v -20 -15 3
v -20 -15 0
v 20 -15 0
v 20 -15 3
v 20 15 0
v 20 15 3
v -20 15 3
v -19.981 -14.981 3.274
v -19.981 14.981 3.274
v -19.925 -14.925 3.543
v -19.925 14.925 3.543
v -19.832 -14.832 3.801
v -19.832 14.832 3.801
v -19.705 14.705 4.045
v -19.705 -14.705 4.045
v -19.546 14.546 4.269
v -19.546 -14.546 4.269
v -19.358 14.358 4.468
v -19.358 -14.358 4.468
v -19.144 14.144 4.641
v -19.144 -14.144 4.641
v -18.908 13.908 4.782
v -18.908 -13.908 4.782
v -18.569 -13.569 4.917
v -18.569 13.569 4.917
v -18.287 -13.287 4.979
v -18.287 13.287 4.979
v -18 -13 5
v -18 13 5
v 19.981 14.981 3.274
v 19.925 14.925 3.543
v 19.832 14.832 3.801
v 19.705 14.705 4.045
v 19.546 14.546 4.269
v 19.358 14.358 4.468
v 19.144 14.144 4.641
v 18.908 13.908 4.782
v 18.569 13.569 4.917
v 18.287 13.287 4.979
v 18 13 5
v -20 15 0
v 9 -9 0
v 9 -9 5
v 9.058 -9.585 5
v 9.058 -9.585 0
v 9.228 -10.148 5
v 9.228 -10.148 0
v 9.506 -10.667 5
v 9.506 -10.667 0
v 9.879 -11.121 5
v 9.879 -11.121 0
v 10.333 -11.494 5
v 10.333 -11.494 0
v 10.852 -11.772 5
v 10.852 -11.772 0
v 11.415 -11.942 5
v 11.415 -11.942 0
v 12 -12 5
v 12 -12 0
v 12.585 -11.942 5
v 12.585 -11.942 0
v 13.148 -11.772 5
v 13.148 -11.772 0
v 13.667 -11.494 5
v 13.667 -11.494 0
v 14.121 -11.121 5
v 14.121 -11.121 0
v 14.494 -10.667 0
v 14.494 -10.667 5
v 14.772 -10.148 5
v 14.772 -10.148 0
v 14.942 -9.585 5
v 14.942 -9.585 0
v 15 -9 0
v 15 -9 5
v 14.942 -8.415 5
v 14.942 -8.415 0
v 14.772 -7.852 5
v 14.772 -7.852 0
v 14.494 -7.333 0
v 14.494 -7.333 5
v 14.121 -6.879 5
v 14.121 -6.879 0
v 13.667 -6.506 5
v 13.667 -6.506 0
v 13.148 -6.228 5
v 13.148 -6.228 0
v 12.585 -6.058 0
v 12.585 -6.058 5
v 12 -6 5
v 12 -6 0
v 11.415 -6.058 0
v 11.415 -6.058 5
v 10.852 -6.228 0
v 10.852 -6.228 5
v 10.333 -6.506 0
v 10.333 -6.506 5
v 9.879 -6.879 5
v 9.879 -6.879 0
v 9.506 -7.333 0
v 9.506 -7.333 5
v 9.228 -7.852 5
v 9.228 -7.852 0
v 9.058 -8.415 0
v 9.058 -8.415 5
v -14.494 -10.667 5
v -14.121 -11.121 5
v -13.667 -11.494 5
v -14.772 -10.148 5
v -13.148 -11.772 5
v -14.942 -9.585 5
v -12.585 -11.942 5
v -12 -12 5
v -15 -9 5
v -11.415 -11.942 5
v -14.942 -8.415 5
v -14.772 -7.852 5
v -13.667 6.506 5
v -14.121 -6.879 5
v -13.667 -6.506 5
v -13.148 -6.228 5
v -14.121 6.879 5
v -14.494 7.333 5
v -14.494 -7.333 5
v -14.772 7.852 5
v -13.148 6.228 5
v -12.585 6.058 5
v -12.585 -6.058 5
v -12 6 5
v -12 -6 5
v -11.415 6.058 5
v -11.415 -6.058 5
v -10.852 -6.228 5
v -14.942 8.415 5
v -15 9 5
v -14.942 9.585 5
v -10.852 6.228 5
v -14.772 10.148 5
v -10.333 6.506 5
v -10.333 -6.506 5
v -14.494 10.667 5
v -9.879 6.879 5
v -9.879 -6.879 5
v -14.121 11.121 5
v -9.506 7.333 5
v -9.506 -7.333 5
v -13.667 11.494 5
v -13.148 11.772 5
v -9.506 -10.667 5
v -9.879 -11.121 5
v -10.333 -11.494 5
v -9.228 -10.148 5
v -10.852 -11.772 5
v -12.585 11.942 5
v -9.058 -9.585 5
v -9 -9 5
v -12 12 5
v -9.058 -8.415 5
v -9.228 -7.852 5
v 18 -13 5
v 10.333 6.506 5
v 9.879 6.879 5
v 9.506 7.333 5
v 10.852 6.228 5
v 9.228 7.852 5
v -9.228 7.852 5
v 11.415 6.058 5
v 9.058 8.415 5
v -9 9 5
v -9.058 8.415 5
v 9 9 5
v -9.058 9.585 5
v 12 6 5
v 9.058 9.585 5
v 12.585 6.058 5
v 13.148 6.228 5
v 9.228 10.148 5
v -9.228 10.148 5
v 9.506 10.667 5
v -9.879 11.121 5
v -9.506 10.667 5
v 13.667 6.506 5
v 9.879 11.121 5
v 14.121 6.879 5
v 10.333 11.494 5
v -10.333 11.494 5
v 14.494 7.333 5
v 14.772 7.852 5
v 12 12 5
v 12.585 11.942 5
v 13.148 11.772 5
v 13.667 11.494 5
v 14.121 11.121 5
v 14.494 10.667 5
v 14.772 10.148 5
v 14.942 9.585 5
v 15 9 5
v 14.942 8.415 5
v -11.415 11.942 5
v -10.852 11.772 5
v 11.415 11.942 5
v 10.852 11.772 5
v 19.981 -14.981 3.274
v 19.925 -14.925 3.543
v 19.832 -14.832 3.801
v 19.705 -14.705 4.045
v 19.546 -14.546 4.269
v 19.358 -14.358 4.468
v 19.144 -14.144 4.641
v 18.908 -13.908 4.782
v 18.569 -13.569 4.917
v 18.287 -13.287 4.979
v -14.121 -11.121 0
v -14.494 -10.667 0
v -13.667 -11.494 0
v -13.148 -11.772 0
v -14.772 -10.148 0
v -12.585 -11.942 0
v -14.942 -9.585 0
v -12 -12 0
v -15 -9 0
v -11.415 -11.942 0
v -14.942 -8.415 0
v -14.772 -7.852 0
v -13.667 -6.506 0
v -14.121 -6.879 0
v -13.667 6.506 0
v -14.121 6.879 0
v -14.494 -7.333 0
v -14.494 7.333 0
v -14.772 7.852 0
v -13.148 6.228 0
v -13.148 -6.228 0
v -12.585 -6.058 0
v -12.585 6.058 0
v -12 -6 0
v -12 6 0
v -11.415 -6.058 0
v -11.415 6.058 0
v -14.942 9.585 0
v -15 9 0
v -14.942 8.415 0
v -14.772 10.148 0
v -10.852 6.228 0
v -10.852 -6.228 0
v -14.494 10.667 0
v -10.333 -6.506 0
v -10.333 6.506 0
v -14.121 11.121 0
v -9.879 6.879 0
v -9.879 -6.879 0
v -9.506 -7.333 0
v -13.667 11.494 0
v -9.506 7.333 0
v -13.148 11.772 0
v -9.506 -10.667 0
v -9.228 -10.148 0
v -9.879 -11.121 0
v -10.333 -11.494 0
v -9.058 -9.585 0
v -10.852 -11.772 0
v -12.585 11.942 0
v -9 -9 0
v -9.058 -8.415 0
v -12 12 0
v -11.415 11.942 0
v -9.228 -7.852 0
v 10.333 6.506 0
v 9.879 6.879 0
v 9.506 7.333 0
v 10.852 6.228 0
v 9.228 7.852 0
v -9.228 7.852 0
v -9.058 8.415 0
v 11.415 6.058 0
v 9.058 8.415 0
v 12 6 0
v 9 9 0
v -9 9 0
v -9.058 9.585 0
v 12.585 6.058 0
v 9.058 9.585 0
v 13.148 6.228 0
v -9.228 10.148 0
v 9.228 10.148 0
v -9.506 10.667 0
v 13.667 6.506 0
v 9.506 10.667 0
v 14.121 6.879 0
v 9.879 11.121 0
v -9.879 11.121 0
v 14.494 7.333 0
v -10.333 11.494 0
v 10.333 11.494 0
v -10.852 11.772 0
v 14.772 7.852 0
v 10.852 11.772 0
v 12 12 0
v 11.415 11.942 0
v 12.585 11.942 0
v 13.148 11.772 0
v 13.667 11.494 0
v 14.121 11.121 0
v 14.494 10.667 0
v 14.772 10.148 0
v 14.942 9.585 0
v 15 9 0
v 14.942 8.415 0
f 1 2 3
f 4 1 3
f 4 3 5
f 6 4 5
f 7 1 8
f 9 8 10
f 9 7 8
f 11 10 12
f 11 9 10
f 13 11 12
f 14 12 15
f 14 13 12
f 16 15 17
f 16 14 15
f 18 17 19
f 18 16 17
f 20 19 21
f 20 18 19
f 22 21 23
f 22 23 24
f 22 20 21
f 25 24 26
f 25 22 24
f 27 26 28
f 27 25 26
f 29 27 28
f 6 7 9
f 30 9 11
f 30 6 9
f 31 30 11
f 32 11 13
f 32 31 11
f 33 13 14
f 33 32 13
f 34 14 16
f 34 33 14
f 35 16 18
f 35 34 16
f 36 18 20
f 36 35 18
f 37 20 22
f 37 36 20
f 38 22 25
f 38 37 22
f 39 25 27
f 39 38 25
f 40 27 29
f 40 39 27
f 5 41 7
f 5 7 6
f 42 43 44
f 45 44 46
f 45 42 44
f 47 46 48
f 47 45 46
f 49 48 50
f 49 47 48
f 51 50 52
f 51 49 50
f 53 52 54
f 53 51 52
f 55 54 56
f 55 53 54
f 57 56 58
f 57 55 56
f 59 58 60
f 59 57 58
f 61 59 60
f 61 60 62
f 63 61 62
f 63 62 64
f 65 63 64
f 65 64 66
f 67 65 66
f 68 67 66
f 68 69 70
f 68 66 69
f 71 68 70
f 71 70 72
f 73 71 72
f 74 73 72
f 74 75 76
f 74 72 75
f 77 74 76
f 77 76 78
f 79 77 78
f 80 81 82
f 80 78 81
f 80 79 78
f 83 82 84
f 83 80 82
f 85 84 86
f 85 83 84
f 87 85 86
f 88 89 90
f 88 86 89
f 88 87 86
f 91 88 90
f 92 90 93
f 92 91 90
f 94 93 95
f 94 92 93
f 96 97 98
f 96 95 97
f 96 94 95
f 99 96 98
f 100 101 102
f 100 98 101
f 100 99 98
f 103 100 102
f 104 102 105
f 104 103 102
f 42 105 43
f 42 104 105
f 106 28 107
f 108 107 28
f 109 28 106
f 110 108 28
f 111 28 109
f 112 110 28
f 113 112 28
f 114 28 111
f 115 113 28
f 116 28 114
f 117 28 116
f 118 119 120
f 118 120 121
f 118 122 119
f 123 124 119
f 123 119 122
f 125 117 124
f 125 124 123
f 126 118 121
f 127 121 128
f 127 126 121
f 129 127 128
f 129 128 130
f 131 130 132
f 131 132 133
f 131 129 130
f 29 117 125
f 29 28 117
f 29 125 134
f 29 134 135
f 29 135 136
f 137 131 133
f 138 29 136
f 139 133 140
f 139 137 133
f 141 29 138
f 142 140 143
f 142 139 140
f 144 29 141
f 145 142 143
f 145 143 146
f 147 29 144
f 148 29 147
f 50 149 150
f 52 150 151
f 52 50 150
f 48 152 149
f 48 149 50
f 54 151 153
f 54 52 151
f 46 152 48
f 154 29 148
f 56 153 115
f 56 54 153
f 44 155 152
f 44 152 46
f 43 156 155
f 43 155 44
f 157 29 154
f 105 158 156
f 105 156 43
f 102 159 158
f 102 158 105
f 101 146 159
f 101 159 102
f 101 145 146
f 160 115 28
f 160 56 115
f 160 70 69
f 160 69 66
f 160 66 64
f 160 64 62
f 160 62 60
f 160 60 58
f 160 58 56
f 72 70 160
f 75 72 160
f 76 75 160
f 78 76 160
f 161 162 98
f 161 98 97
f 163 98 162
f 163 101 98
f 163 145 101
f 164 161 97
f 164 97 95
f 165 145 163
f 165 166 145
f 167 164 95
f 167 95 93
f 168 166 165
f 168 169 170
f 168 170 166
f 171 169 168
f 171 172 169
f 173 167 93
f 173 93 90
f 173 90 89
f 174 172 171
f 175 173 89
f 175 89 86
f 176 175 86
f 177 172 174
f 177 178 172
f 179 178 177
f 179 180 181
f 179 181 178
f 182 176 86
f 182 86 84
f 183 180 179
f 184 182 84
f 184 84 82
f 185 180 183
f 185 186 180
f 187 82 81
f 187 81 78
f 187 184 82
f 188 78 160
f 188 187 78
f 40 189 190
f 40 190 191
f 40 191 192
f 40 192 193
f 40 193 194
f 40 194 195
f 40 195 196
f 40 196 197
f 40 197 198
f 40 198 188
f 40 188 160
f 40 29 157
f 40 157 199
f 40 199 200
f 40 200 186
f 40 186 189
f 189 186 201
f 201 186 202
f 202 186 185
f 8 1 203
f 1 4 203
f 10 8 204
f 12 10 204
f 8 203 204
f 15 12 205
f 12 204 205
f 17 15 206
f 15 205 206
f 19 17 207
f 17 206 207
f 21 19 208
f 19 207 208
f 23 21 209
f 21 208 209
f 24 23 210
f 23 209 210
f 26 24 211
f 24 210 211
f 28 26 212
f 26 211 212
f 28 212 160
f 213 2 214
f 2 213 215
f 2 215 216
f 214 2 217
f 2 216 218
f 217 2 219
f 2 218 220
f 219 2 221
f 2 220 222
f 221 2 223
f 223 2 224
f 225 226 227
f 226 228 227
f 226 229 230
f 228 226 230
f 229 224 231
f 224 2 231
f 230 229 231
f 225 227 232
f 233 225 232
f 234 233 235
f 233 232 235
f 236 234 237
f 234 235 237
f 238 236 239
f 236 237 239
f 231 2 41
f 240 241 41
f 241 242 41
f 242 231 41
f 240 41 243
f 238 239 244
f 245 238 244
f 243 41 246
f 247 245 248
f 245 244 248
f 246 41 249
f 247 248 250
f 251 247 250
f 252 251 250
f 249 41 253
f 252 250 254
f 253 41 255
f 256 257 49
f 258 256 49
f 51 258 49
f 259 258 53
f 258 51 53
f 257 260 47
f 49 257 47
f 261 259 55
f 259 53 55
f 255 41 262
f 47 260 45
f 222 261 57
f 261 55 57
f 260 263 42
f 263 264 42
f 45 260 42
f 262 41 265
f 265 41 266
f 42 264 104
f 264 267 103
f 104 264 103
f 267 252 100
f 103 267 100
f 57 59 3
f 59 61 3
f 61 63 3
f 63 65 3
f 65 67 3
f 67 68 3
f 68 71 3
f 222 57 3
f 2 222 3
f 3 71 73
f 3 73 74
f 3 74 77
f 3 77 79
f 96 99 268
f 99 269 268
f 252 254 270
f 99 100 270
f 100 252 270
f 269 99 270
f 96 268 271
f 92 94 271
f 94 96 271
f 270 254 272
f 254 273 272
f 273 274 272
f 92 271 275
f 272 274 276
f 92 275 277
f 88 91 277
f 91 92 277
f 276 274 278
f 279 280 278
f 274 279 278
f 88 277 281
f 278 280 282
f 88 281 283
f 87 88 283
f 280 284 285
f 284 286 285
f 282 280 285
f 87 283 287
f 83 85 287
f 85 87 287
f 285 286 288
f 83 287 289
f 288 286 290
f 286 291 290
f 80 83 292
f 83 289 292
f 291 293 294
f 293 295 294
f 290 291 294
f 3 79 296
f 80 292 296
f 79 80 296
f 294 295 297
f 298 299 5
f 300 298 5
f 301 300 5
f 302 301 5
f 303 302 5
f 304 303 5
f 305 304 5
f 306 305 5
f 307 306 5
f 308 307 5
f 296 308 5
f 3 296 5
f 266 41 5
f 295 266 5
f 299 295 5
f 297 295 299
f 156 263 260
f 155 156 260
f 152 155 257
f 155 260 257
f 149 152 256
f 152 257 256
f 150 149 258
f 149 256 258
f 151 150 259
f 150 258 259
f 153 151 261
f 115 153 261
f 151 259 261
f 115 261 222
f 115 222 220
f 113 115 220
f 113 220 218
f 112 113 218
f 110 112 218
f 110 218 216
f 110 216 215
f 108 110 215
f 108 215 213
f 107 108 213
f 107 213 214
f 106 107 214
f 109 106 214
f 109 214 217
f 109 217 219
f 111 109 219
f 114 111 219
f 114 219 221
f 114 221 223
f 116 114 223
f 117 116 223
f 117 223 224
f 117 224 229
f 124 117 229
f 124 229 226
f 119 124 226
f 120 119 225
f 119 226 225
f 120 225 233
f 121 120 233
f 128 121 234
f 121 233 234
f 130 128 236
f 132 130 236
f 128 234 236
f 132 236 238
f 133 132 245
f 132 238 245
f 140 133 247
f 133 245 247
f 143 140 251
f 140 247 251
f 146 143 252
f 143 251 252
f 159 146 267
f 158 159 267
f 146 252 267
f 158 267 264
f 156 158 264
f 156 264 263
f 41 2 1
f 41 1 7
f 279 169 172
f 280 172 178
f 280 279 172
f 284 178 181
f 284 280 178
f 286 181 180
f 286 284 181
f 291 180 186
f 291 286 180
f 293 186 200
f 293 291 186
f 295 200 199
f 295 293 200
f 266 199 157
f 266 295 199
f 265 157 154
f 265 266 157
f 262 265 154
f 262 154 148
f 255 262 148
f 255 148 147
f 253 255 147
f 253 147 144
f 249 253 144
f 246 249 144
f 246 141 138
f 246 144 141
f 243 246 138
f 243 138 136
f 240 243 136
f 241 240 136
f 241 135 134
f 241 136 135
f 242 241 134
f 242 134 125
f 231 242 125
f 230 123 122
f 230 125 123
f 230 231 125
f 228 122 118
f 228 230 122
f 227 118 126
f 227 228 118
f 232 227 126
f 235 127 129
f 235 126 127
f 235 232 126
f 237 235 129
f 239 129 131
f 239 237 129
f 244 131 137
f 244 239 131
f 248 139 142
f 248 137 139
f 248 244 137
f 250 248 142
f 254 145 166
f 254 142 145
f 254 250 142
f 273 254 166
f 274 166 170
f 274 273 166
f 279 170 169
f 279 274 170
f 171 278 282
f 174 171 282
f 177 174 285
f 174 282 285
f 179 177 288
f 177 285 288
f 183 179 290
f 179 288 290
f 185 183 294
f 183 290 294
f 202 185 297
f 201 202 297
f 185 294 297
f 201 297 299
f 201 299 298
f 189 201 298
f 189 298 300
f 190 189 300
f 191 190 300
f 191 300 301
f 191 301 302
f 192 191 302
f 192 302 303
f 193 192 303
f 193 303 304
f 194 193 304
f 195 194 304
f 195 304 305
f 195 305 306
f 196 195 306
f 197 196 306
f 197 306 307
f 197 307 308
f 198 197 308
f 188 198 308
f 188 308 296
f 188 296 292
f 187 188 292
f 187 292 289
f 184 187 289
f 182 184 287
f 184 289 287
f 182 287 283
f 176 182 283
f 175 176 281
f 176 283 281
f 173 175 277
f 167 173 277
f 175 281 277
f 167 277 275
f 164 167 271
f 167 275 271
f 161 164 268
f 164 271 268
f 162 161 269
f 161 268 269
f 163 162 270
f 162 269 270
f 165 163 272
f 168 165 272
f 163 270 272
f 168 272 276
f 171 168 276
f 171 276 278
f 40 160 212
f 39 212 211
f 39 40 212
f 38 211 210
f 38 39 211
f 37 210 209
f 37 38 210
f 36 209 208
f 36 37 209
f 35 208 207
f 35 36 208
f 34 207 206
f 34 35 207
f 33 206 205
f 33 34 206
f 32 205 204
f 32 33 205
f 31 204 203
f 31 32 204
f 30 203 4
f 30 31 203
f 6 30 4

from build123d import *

# Parameters (mm, degrees)
F0_R     = 3
F1_DEPTH = 25
F4_W     = 40
F4_H     = 30
F5_DEPTH = 5
F7_R     = 2


with BuildPart() as f1:
    # F0 (on Top) → F1 (new body)
    with BuildSketch(Plane.XY):
        with Locations((-12, 9)):
            Circle(F0_R)
    extrude(amount=F1_DEPTH)


with BuildPart() as f2_1:
    # F2: instance of F1
    add(f1.part.mirror(Plane.YZ))


with BuildPart() as f3_1:
    # F3: instance of F1
    add(f1.part.mirror(Plane.XZ))


with BuildPart() as f3_2:
    # F3: instance of F2_1
    add(f2_1.part.mirror(Plane.XZ))


with BuildPart() as f5:
    # F4 (on Top) → F5 (new body)
    with BuildSketch(Plane.XY):
        Rectangle(F4_W, F4_H)
    extrude(amount=F5_DEPTH)

    # F6: cut F1, F2_1, F3_1, F3_2
    add(f1.part, mode=Mode.SUBTRACT)
    add(f2_1.part, mode=Mode.SUBTRACT)
    add(f3_1.part, mode=Mode.SUBTRACT)
    add(f3_2.part, mode=Mode.SUBTRACT)

    # F7
    f7_edges = [f5.edges().sort_by_distance(p)[0] for p in [
        (0, -15, 5),
        (-20, 0, 5),
        (0, 15, 5),
        (20, 0, 5),
    ]]
    fillet(f7_edges, radius=F7_R)


solid = f5.part
